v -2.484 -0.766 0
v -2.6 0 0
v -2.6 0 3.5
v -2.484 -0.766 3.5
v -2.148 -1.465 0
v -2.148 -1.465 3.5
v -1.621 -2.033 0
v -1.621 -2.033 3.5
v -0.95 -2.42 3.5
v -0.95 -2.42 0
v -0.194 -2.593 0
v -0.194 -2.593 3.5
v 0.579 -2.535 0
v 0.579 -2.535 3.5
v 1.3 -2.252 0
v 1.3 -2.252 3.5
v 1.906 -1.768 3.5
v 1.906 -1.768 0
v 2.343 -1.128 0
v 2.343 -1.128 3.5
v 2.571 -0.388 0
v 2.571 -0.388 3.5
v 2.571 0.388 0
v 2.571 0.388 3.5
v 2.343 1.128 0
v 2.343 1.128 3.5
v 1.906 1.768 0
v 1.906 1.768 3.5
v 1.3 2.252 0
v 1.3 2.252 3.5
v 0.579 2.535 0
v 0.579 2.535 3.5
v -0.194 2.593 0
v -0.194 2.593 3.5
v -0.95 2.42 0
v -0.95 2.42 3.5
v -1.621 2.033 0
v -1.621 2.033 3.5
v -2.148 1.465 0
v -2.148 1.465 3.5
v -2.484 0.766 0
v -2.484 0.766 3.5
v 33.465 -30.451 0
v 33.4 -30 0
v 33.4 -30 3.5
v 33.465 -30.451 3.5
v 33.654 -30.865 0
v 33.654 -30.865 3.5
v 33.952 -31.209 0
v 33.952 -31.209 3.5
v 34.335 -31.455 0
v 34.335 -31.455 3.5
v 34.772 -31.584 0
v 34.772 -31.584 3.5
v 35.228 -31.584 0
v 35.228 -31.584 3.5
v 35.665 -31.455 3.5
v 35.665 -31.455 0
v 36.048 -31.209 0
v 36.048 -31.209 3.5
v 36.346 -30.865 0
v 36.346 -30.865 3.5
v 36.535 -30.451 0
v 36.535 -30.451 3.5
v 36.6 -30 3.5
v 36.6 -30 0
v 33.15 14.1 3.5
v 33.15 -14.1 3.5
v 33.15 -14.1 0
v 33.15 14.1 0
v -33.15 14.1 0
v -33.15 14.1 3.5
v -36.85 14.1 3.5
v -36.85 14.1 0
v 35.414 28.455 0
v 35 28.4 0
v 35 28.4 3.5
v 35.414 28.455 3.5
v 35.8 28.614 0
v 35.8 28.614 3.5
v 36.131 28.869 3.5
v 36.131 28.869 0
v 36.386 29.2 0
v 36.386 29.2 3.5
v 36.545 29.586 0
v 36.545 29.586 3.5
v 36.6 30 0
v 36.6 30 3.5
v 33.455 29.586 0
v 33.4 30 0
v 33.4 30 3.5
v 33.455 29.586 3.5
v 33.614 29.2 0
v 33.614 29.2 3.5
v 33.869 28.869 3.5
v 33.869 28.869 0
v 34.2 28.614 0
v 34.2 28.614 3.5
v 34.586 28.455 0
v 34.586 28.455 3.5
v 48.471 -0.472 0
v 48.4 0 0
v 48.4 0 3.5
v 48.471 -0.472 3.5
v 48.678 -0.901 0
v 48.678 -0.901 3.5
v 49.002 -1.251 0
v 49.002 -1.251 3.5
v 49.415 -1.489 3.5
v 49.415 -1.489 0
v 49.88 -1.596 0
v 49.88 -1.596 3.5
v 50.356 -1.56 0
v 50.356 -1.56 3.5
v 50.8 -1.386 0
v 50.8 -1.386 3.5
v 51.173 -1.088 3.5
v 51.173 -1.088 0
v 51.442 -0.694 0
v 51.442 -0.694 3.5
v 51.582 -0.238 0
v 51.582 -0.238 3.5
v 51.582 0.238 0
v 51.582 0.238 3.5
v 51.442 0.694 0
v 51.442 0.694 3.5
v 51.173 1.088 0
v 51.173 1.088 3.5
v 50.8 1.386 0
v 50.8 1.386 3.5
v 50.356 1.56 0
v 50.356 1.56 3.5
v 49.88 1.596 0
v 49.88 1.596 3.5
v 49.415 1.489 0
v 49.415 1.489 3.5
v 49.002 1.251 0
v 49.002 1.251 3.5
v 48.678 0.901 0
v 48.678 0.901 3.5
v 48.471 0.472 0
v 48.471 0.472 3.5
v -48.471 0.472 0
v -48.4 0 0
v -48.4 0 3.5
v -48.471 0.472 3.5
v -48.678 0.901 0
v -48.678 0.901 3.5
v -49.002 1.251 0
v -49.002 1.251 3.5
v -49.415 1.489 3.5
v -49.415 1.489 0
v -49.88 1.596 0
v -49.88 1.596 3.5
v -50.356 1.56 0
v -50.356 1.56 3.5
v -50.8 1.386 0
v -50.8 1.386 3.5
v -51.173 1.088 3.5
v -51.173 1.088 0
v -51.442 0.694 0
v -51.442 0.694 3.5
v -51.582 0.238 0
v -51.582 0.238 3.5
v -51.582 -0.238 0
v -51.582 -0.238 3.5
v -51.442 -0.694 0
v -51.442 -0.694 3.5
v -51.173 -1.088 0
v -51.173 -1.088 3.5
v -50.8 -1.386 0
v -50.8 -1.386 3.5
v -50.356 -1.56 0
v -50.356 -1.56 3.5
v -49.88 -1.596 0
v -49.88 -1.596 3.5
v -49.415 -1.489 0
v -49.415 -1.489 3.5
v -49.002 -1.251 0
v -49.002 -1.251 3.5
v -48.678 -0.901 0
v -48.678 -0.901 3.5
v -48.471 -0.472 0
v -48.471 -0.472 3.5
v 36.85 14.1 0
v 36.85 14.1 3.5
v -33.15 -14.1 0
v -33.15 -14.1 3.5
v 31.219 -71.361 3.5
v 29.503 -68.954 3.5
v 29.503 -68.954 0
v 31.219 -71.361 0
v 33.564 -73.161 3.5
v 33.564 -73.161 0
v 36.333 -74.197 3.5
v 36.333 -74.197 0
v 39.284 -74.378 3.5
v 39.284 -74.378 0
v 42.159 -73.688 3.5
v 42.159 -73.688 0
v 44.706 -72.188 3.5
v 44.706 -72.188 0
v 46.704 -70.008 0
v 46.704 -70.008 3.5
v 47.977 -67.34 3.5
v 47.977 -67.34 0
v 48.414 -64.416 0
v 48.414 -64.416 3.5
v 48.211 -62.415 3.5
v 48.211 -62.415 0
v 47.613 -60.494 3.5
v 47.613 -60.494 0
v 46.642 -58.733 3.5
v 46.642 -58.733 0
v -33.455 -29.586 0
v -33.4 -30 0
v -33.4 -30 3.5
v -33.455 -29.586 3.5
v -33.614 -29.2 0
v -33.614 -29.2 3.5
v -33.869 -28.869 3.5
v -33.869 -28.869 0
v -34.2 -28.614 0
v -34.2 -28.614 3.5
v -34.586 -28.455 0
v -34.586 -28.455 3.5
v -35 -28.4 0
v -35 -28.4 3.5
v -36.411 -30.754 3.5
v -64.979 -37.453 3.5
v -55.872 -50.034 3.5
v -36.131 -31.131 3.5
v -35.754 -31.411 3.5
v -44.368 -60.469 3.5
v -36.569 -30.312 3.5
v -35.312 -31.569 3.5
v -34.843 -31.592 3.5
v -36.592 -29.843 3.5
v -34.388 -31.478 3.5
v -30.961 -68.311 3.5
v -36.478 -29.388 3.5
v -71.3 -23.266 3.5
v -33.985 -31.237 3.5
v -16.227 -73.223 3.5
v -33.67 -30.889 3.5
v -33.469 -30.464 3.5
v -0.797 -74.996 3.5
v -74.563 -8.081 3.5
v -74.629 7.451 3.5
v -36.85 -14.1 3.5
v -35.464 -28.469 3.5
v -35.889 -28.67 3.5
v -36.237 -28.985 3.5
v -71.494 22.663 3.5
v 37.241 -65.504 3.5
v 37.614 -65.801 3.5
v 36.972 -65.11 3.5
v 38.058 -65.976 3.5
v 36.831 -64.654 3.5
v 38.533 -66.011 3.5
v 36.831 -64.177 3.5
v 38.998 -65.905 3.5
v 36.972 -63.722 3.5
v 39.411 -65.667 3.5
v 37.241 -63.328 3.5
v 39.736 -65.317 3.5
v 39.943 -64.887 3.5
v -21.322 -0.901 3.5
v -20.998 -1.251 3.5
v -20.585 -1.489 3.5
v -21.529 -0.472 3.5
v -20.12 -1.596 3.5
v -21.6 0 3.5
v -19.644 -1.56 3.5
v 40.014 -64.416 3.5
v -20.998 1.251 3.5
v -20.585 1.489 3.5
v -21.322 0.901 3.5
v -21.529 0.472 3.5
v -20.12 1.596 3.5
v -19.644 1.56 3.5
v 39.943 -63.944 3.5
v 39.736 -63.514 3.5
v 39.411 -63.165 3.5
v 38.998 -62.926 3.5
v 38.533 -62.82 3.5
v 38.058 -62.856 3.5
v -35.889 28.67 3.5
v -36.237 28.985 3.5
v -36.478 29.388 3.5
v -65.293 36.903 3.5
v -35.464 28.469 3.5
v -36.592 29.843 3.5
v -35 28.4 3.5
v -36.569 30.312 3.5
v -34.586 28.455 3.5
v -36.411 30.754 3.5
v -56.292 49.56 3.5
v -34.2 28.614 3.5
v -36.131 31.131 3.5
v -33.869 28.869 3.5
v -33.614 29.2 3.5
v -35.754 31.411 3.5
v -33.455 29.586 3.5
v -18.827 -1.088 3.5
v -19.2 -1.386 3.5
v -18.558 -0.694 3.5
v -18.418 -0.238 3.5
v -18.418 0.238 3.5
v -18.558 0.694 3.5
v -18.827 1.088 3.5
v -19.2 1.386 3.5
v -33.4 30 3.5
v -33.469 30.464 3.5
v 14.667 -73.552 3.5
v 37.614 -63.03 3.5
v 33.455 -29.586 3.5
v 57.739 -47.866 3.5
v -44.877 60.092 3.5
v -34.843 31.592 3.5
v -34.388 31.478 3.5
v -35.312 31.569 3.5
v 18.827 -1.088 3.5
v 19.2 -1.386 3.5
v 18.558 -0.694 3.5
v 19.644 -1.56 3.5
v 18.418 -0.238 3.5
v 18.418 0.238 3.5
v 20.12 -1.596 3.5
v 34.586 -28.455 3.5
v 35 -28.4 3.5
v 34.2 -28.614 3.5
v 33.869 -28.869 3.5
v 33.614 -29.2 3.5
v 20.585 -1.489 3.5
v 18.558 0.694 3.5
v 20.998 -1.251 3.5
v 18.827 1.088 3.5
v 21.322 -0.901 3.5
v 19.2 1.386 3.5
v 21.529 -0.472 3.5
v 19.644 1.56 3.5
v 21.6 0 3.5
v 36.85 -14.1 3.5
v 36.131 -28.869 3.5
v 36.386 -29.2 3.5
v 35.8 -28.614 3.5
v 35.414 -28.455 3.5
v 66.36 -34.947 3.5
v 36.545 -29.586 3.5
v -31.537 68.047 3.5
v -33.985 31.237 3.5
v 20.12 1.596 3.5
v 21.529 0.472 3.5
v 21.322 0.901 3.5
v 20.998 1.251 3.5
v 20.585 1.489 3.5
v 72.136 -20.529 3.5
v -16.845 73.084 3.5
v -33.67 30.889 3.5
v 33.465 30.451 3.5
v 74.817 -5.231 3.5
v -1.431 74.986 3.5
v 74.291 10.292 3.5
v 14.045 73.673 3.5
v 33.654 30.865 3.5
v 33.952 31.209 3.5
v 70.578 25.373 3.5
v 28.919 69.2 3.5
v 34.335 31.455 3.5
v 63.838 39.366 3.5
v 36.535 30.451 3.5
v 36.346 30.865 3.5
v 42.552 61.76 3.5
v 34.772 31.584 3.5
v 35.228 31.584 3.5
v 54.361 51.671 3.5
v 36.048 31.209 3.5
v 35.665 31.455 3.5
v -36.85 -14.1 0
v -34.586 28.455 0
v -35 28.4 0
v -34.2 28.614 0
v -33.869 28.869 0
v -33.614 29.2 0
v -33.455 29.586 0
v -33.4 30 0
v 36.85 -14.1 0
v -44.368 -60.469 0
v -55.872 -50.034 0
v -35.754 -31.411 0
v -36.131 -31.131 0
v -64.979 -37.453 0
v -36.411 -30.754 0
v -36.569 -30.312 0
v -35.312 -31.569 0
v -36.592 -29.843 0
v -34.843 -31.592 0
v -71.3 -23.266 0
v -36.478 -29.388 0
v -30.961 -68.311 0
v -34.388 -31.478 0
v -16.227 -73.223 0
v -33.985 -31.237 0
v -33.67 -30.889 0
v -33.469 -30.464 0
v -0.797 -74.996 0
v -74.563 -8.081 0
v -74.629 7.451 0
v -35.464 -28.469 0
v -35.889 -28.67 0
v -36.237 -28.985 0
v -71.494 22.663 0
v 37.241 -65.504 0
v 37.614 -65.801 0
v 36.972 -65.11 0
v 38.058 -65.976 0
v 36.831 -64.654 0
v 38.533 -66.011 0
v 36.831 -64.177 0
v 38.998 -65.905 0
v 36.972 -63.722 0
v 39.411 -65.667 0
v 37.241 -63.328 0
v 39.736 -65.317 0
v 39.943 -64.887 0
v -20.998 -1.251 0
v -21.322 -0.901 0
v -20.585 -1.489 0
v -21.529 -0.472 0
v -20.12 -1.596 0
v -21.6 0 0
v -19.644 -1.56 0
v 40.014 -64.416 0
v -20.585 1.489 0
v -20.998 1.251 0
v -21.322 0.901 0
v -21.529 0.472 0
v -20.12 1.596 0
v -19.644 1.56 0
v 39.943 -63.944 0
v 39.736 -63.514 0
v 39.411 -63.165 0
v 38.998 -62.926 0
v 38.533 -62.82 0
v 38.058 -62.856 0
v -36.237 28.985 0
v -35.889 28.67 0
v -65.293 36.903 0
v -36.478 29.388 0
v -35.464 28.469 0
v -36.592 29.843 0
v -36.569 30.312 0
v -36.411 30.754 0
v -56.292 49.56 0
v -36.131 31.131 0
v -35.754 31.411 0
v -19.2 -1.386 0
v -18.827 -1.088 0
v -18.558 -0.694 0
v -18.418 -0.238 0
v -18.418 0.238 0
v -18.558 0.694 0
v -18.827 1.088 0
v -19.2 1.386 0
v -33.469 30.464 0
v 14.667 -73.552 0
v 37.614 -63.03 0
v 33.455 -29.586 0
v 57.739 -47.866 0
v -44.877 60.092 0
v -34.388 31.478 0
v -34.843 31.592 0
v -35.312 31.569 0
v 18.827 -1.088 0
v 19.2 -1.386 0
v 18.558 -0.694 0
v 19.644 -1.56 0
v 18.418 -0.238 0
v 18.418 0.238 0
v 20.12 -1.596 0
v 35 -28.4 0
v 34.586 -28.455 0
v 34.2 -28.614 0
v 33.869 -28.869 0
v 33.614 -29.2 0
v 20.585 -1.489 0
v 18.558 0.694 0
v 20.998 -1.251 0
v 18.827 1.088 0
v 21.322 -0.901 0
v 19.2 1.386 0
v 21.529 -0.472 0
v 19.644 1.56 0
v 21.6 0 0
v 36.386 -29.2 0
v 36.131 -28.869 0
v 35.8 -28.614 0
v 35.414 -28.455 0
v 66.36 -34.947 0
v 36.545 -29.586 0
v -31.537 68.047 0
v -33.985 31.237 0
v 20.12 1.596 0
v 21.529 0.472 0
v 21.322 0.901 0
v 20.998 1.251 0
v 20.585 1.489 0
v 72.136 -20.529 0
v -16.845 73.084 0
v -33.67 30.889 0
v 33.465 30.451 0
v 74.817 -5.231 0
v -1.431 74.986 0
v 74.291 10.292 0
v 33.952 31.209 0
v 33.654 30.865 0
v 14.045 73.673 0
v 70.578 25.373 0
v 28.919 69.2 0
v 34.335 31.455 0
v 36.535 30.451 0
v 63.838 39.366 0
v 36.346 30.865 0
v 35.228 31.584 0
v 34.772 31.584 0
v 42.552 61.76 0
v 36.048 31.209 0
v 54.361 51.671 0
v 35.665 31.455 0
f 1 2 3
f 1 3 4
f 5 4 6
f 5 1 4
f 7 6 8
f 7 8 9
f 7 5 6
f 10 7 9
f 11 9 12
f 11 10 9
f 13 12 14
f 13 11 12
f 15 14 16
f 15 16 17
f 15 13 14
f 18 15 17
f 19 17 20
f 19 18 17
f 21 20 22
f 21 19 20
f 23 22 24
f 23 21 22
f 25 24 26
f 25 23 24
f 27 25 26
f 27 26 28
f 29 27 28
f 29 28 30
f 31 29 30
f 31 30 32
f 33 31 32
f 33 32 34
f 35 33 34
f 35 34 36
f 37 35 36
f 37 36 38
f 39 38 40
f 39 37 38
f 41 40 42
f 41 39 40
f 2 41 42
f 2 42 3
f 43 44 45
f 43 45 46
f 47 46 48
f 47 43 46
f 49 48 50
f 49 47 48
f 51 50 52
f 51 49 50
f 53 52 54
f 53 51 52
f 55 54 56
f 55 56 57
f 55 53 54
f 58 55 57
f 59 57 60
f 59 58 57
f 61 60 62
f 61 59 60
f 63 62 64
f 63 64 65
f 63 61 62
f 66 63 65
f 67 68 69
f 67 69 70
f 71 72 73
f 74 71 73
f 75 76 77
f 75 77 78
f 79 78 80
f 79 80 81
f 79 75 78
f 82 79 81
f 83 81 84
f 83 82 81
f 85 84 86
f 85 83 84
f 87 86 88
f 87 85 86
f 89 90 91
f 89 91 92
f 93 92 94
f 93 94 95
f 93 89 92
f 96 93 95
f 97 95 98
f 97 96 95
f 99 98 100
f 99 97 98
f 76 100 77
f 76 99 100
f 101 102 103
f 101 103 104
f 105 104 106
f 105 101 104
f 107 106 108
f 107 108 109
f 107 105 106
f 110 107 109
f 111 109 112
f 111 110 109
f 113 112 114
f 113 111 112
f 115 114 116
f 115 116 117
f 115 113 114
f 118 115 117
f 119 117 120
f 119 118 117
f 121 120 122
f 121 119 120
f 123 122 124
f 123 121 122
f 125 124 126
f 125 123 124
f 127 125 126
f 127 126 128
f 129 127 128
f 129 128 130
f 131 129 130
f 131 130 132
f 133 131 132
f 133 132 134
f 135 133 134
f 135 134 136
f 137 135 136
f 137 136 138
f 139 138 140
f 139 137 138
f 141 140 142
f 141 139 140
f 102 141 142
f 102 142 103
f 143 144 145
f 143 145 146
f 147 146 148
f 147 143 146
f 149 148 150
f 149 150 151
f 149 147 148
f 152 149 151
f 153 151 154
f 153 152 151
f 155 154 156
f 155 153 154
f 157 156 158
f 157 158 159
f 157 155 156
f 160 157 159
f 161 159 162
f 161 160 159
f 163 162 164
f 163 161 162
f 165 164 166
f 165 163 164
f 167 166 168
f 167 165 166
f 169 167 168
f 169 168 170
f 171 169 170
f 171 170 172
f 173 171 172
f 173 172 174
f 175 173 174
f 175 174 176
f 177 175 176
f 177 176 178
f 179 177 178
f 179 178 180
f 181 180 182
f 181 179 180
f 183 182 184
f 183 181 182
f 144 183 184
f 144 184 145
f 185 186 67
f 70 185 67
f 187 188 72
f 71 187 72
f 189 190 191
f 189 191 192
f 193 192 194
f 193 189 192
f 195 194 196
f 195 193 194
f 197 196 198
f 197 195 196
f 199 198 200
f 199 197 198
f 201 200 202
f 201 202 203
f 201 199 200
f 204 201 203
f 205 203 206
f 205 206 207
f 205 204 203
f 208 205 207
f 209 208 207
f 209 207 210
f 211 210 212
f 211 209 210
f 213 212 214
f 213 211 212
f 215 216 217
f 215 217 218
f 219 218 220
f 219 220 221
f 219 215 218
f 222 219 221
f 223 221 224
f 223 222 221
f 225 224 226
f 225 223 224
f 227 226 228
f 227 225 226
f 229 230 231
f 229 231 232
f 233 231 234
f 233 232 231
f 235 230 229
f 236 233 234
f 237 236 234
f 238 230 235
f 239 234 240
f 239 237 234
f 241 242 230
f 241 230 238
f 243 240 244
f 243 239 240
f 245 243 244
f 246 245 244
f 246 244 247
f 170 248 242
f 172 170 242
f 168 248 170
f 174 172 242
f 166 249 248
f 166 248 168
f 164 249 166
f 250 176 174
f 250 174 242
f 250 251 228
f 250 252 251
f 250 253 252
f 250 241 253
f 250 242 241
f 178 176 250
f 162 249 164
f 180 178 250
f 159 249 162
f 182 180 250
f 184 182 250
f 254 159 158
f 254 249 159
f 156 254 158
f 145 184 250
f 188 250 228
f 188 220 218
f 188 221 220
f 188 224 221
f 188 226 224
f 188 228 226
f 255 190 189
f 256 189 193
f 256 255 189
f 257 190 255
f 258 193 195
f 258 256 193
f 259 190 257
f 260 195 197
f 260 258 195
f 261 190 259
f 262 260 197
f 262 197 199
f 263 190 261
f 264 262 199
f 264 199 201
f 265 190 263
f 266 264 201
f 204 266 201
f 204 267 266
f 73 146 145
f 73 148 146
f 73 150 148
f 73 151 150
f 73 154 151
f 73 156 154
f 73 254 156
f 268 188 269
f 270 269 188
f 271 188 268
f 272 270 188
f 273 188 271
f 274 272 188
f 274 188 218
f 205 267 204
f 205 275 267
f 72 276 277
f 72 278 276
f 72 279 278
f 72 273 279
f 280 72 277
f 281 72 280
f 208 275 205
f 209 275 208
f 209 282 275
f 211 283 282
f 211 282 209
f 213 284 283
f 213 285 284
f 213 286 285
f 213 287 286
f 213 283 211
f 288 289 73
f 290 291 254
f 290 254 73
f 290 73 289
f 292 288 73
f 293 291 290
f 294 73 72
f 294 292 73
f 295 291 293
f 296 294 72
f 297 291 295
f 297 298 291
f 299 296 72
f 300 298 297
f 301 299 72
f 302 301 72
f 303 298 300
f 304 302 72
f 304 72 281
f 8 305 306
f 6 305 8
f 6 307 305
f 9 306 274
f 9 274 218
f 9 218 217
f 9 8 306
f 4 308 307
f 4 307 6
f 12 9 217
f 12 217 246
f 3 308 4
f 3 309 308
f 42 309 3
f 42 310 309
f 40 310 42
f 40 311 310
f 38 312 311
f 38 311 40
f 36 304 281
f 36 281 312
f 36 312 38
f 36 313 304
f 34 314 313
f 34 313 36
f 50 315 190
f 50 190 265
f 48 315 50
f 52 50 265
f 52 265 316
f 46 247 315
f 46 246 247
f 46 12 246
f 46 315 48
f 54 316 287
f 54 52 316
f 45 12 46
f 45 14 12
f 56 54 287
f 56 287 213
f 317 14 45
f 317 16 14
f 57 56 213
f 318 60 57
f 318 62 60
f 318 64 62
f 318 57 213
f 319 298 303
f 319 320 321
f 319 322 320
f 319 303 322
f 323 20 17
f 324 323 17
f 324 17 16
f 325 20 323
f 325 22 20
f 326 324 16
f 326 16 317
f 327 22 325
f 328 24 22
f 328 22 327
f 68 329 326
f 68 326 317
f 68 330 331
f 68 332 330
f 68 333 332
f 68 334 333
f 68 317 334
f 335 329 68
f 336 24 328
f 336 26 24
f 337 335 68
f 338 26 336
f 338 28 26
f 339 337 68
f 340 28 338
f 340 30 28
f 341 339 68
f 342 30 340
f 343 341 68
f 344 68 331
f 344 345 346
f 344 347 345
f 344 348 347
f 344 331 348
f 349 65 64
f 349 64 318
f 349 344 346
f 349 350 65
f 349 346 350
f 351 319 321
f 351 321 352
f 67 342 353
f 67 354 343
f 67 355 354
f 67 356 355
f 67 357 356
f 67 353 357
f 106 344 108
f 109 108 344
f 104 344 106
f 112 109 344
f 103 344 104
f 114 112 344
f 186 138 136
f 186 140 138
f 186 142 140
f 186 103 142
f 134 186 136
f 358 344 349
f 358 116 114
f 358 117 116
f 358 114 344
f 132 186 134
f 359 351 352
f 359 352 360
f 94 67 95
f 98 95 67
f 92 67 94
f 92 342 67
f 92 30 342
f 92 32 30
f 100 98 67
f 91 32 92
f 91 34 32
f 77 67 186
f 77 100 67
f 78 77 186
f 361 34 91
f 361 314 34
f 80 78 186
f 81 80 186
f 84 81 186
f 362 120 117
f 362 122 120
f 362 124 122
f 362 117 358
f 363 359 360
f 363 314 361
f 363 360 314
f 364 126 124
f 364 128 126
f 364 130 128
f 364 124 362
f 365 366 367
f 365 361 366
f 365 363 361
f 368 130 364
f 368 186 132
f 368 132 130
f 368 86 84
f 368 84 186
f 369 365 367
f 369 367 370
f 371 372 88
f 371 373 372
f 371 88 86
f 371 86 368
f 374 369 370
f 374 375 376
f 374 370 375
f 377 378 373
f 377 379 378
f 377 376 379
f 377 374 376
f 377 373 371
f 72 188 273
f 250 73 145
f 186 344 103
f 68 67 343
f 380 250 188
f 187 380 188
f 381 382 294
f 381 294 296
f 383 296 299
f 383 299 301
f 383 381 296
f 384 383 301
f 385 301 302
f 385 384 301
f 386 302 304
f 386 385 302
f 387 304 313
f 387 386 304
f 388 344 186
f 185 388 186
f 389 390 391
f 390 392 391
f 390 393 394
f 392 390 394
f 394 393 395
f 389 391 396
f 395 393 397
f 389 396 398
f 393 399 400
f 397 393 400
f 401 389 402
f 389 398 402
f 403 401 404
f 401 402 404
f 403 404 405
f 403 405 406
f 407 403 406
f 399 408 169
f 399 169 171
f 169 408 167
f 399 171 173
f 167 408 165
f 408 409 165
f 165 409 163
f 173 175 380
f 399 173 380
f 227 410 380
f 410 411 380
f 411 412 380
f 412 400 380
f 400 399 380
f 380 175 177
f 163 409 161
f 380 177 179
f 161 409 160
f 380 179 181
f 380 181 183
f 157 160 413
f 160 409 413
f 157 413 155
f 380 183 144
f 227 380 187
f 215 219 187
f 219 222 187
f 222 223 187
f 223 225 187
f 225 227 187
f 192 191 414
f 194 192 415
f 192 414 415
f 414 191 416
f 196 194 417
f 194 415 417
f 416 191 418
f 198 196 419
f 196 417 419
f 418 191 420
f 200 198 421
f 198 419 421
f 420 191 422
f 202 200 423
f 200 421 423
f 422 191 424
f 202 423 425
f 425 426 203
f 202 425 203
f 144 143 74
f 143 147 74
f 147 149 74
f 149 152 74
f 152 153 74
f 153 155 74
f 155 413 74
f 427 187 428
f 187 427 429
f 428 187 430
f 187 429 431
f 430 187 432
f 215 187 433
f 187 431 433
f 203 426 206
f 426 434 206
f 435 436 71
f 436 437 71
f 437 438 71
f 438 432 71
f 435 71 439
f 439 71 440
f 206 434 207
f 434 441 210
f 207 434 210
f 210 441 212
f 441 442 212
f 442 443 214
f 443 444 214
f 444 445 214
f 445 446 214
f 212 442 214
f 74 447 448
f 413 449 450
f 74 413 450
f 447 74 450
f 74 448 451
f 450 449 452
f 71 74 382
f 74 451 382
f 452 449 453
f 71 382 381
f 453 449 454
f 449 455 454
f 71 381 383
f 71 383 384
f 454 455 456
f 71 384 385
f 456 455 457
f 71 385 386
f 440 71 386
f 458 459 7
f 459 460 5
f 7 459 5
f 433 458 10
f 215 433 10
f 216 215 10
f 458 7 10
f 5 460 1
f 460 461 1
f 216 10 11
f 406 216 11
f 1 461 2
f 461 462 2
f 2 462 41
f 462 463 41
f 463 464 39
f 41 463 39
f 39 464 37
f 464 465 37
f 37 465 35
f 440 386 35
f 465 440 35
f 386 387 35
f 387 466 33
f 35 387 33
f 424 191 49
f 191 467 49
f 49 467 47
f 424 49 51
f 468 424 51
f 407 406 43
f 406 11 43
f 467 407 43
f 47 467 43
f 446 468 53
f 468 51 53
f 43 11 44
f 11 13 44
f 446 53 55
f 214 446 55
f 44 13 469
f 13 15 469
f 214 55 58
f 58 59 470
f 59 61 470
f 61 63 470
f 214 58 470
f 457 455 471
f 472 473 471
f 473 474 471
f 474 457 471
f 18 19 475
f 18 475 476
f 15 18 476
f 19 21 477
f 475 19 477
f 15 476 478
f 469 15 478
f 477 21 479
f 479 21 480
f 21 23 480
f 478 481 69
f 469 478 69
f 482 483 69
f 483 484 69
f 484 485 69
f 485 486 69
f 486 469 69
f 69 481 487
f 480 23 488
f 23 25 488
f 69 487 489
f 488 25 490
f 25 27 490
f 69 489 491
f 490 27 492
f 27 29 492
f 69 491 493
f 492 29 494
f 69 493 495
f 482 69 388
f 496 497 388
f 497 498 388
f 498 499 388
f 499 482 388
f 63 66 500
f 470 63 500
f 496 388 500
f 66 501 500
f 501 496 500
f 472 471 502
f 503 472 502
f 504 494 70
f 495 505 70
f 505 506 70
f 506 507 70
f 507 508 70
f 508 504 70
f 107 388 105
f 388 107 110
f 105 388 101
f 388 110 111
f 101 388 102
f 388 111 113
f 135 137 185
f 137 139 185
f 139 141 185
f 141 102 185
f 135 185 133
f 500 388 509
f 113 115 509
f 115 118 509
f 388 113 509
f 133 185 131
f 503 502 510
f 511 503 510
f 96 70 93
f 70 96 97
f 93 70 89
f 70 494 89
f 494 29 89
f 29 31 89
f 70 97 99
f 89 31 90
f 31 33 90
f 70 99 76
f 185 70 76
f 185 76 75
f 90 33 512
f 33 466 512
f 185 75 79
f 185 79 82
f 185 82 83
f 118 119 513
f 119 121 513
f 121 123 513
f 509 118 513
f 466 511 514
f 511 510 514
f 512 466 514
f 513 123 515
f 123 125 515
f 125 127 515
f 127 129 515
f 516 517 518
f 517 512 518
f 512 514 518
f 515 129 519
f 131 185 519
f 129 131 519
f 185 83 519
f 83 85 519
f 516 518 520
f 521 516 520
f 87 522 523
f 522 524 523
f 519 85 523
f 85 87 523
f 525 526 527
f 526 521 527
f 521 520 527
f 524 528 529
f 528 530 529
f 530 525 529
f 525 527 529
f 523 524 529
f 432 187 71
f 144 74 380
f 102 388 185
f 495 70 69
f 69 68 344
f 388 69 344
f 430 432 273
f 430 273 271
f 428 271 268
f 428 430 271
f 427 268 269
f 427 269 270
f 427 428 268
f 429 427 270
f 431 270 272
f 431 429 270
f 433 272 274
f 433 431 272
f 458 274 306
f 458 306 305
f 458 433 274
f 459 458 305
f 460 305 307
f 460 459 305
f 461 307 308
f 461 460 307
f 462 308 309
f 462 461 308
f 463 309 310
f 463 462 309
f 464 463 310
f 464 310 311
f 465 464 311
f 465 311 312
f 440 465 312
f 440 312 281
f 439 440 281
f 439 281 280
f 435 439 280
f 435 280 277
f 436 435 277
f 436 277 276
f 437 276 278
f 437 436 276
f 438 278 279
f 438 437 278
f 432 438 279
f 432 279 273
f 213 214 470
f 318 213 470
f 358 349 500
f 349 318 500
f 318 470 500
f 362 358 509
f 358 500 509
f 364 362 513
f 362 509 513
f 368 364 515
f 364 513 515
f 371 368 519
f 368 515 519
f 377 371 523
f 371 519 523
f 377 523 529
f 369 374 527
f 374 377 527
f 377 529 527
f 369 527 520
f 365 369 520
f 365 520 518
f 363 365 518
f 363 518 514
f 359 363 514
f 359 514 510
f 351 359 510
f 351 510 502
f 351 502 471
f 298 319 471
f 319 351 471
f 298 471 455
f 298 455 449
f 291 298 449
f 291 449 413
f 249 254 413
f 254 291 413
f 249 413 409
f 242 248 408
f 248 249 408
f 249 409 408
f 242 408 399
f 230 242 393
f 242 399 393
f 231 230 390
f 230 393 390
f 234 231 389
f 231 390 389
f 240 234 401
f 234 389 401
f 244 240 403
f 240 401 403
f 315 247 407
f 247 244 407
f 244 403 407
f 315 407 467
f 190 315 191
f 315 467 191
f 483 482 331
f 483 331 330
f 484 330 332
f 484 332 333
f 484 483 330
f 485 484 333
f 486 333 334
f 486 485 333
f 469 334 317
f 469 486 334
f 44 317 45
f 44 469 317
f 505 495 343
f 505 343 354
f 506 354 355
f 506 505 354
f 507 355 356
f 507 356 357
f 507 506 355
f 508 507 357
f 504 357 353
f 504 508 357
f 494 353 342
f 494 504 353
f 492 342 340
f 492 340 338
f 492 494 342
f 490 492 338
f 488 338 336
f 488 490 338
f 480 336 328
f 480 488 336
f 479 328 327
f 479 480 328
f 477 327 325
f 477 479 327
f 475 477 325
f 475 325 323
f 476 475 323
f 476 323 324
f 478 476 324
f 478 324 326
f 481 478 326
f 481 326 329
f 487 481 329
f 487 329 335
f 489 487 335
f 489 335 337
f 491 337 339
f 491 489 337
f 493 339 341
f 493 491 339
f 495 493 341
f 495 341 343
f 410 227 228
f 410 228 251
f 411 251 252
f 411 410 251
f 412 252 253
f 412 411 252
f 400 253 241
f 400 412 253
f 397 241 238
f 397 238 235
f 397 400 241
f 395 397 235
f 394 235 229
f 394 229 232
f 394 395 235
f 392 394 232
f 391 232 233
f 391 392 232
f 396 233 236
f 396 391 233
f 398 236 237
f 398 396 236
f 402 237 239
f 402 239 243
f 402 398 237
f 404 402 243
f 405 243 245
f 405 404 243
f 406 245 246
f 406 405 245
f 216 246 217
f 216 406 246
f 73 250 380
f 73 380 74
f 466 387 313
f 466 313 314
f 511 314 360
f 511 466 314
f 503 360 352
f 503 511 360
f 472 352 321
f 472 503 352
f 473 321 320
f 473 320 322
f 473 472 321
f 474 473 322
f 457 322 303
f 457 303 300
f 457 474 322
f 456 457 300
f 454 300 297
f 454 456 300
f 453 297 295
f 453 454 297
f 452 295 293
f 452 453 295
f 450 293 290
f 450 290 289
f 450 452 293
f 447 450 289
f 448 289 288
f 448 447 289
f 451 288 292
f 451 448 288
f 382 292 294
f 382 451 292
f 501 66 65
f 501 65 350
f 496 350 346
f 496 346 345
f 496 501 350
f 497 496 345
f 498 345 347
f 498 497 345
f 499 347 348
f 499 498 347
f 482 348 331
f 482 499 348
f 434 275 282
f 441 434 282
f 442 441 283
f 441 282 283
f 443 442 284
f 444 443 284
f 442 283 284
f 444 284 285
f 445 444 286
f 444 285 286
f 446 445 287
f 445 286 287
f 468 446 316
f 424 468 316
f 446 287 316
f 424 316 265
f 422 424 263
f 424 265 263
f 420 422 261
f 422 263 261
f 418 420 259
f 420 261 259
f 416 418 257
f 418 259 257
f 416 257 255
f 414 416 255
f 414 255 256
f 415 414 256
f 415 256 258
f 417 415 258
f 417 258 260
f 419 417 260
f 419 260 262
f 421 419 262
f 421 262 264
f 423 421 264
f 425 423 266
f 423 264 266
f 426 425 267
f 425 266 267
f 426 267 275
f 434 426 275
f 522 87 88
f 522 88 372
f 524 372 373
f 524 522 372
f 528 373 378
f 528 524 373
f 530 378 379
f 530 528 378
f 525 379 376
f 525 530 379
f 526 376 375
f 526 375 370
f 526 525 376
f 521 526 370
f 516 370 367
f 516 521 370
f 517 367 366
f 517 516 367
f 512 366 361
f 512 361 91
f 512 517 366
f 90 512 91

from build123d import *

# Parameters (mm, degrees)
F0_R     = 75
F1_DEPTH = 3.5
F2_R     = 1.6
F3_DEPTH = 3.5
F5_DEPTH = 3.5
F6_R     = 1.6
F7_DEPTH = 3.5
F8_W     = 1.85
F8_H     = 28.2
F9_DEPTH = 3.501


with BuildPart() as f1:
    # F0 (on Top) → F1 (new body)
    with BuildSketch(Plane.XY):
        Circle(F0_R)
    extrude(amount=F1_DEPTH)

    # F2 (on Top) → F3 (cut)
    with BuildSketch(Plane.XY):
        with BuildLine():
            ThreePointArc((-35, -28.4), (-36.1313708499, -31.1313708499), (-33.4, -30))
            Line((-33.4, -30), (-35, -30))
            Line((-35, -30), (-35, -28.4))
        make_face()
        with BuildLine():
            Line((-35, -30), (-33.4, -30))
            ThreePointArc((-33.4, -30), (-33.8686291501, -28.8686291501), (-35, -28.4))
            Line((-35, -28.4), (-35, -30))
        make_face()
        with Locations((-50, 0)):
            Circle(F2_R)
        with BuildLine():
            ThreePointArc((51.6, 0), (50, 1.6), (48.4, 0))
            ThreePointArc((48.4, 0), (50, -1.6), (51.6, 0))
        make_face()
        with BuildLine():
            ThreePointArc((35, -28.4), (33.8686291501, -28.8686291501), (33.4, -30))
            Line((33.4, -30), (35, -30))
            Line((35, -30), (35, -28.4))
        make_face()
        with BuildLine():
            Line((35, -30), (33.4, -30))
            ThreePointArc((33.4, -30), (35, -31.6), (36.6, -30))
            ThreePointArc((36.6, -30), (36.1313708499, -28.8686291501), (35, -28.4))
            Line((35, -28.4), (35, -30))
        make_face()
        with BuildLine():
            ThreePointArc((-33.4, 30), (-36.1313708499, 31.1313708499), (-35, 28.4))
            Line((-35, 28.4), (-35, 30))
            Line((-35, 30), (-33.4, 30))
        make_face()
        with BuildLine():
            Line((-35, 30), (-35, 28.4))
            ThreePointArc((-35, 28.4), (-33.8686291501, 28.8686291501), (-33.4, 30))
            Line((-33.4, 30), (-35, 30))
        make_face()
        with BuildLine():
            ThreePointArc((-18.4, 0), (-20, 1.6), (-21.6, 0))
            Line((-21.6, 0), (-20, 0))
            Line((-20, 0), (-18.4, 0))
        make_face()
        with BuildLine():
            Line((-20, 0), (-21.6, 0))
            ThreePointArc((-21.6, 0), (-20, -1.6), (-18.4, 0))
            Line((-18.4, 0), (-20, 0))
        make_face()
        with BuildLine():
            ThreePointArc((33.4, 30), (33.8686291501, 28.8686291501), (35, 28.4))
            Line((35, 28.4), (35, 30))
            Line((35, 30), (33.4, 30))
        make_face()
        with BuildLine():
            Line((35, 30), (35, 28.4))
            ThreePointArc((35, 28.4), (36.1313708499, 28.8686291501), (36.6, 30))
            ThreePointArc((36.6, 30), (35, 31.6), (33.4, 30))
            Line((33.4, 30), (35, 30))
        make_face()
        with BuildLine():
            ThreePointArc((18.4, 0), (20, -1.6), (21.6, 0))
            Line((21.6, 0), (20, 0))
            Line((20, 0), (18.4, 0))
        make_face()
        with BuildLine():
            Line((20, 0), (21.6, 0))
            ThreePointArc((21.6, 0), (20, 1.6), (18.4, 0))
            Line((18.4, 0), (20, 0))
        make_face()
        with BuildLine():
            ThreePointArc((2.6, 0), (0, 2.6), (-2.6, 0))
            Line((-2.6, 0), (2.6, 0))
        make_face()
        with BuildLine():
            Line((2.6, 0), (-2.6, 0))
            ThreePointArc((-2.6, 0), (0, -2.6), (2.6, 0))
        make_face()
    extrude(amount=F3_DEPTH, mode=Mode.SUBTRACT)

    # F4 (on face) → F5 (join)
    with BuildSketch(Plane.XY.offset(3.5)):
        with BuildLine():
            ThreePointArc((29.5025076199, -68.9536224149), (40.7469515469, -74.139754822), (48.4136259754, -64.4157848623))
            ThreePointArc((48.4136259754, -64.4157848623), (47.9604080116, -61.4393855689), (46.6418354247, -58.732777801))
            ThreePointArc((46.6418354247, -58.732777801), (38.4136259754, -64.4157848623), (29.5025076199, -68.9536224149))
        make_face()
    extrude(amount=-F5_DEPTH)

    # F6 (on face) → F7 (cut)
    with BuildSketch(Plane.XY.offset(3.5)):
        with Locations((38.4136259754, -64.4157848623)):
            Circle(F6_R)
    extrude(amount=-F7_DEPTH, mode=Mode.SUBTRACT)

    # F8 (on face) → F9 (cut, through all)
    with BuildSketch(Plane.XY.offset(3.5)):
        with Locations((-34.075, 0)):
            Rectangle(F8_W, F8_H)
        with Locations((-35.925, 0)):
            Rectangle(F8_W, F8_H)
        with Locations((35.925, 0)):
            Rectangle(F8_W, F8_H)
        with Locations((34.075, 0)):
            Rectangle(F8_W, F8_H)
    extrude(amount=-F9_DEPTH, mode=Mode.SUBTRACT)


solid = f1.part
